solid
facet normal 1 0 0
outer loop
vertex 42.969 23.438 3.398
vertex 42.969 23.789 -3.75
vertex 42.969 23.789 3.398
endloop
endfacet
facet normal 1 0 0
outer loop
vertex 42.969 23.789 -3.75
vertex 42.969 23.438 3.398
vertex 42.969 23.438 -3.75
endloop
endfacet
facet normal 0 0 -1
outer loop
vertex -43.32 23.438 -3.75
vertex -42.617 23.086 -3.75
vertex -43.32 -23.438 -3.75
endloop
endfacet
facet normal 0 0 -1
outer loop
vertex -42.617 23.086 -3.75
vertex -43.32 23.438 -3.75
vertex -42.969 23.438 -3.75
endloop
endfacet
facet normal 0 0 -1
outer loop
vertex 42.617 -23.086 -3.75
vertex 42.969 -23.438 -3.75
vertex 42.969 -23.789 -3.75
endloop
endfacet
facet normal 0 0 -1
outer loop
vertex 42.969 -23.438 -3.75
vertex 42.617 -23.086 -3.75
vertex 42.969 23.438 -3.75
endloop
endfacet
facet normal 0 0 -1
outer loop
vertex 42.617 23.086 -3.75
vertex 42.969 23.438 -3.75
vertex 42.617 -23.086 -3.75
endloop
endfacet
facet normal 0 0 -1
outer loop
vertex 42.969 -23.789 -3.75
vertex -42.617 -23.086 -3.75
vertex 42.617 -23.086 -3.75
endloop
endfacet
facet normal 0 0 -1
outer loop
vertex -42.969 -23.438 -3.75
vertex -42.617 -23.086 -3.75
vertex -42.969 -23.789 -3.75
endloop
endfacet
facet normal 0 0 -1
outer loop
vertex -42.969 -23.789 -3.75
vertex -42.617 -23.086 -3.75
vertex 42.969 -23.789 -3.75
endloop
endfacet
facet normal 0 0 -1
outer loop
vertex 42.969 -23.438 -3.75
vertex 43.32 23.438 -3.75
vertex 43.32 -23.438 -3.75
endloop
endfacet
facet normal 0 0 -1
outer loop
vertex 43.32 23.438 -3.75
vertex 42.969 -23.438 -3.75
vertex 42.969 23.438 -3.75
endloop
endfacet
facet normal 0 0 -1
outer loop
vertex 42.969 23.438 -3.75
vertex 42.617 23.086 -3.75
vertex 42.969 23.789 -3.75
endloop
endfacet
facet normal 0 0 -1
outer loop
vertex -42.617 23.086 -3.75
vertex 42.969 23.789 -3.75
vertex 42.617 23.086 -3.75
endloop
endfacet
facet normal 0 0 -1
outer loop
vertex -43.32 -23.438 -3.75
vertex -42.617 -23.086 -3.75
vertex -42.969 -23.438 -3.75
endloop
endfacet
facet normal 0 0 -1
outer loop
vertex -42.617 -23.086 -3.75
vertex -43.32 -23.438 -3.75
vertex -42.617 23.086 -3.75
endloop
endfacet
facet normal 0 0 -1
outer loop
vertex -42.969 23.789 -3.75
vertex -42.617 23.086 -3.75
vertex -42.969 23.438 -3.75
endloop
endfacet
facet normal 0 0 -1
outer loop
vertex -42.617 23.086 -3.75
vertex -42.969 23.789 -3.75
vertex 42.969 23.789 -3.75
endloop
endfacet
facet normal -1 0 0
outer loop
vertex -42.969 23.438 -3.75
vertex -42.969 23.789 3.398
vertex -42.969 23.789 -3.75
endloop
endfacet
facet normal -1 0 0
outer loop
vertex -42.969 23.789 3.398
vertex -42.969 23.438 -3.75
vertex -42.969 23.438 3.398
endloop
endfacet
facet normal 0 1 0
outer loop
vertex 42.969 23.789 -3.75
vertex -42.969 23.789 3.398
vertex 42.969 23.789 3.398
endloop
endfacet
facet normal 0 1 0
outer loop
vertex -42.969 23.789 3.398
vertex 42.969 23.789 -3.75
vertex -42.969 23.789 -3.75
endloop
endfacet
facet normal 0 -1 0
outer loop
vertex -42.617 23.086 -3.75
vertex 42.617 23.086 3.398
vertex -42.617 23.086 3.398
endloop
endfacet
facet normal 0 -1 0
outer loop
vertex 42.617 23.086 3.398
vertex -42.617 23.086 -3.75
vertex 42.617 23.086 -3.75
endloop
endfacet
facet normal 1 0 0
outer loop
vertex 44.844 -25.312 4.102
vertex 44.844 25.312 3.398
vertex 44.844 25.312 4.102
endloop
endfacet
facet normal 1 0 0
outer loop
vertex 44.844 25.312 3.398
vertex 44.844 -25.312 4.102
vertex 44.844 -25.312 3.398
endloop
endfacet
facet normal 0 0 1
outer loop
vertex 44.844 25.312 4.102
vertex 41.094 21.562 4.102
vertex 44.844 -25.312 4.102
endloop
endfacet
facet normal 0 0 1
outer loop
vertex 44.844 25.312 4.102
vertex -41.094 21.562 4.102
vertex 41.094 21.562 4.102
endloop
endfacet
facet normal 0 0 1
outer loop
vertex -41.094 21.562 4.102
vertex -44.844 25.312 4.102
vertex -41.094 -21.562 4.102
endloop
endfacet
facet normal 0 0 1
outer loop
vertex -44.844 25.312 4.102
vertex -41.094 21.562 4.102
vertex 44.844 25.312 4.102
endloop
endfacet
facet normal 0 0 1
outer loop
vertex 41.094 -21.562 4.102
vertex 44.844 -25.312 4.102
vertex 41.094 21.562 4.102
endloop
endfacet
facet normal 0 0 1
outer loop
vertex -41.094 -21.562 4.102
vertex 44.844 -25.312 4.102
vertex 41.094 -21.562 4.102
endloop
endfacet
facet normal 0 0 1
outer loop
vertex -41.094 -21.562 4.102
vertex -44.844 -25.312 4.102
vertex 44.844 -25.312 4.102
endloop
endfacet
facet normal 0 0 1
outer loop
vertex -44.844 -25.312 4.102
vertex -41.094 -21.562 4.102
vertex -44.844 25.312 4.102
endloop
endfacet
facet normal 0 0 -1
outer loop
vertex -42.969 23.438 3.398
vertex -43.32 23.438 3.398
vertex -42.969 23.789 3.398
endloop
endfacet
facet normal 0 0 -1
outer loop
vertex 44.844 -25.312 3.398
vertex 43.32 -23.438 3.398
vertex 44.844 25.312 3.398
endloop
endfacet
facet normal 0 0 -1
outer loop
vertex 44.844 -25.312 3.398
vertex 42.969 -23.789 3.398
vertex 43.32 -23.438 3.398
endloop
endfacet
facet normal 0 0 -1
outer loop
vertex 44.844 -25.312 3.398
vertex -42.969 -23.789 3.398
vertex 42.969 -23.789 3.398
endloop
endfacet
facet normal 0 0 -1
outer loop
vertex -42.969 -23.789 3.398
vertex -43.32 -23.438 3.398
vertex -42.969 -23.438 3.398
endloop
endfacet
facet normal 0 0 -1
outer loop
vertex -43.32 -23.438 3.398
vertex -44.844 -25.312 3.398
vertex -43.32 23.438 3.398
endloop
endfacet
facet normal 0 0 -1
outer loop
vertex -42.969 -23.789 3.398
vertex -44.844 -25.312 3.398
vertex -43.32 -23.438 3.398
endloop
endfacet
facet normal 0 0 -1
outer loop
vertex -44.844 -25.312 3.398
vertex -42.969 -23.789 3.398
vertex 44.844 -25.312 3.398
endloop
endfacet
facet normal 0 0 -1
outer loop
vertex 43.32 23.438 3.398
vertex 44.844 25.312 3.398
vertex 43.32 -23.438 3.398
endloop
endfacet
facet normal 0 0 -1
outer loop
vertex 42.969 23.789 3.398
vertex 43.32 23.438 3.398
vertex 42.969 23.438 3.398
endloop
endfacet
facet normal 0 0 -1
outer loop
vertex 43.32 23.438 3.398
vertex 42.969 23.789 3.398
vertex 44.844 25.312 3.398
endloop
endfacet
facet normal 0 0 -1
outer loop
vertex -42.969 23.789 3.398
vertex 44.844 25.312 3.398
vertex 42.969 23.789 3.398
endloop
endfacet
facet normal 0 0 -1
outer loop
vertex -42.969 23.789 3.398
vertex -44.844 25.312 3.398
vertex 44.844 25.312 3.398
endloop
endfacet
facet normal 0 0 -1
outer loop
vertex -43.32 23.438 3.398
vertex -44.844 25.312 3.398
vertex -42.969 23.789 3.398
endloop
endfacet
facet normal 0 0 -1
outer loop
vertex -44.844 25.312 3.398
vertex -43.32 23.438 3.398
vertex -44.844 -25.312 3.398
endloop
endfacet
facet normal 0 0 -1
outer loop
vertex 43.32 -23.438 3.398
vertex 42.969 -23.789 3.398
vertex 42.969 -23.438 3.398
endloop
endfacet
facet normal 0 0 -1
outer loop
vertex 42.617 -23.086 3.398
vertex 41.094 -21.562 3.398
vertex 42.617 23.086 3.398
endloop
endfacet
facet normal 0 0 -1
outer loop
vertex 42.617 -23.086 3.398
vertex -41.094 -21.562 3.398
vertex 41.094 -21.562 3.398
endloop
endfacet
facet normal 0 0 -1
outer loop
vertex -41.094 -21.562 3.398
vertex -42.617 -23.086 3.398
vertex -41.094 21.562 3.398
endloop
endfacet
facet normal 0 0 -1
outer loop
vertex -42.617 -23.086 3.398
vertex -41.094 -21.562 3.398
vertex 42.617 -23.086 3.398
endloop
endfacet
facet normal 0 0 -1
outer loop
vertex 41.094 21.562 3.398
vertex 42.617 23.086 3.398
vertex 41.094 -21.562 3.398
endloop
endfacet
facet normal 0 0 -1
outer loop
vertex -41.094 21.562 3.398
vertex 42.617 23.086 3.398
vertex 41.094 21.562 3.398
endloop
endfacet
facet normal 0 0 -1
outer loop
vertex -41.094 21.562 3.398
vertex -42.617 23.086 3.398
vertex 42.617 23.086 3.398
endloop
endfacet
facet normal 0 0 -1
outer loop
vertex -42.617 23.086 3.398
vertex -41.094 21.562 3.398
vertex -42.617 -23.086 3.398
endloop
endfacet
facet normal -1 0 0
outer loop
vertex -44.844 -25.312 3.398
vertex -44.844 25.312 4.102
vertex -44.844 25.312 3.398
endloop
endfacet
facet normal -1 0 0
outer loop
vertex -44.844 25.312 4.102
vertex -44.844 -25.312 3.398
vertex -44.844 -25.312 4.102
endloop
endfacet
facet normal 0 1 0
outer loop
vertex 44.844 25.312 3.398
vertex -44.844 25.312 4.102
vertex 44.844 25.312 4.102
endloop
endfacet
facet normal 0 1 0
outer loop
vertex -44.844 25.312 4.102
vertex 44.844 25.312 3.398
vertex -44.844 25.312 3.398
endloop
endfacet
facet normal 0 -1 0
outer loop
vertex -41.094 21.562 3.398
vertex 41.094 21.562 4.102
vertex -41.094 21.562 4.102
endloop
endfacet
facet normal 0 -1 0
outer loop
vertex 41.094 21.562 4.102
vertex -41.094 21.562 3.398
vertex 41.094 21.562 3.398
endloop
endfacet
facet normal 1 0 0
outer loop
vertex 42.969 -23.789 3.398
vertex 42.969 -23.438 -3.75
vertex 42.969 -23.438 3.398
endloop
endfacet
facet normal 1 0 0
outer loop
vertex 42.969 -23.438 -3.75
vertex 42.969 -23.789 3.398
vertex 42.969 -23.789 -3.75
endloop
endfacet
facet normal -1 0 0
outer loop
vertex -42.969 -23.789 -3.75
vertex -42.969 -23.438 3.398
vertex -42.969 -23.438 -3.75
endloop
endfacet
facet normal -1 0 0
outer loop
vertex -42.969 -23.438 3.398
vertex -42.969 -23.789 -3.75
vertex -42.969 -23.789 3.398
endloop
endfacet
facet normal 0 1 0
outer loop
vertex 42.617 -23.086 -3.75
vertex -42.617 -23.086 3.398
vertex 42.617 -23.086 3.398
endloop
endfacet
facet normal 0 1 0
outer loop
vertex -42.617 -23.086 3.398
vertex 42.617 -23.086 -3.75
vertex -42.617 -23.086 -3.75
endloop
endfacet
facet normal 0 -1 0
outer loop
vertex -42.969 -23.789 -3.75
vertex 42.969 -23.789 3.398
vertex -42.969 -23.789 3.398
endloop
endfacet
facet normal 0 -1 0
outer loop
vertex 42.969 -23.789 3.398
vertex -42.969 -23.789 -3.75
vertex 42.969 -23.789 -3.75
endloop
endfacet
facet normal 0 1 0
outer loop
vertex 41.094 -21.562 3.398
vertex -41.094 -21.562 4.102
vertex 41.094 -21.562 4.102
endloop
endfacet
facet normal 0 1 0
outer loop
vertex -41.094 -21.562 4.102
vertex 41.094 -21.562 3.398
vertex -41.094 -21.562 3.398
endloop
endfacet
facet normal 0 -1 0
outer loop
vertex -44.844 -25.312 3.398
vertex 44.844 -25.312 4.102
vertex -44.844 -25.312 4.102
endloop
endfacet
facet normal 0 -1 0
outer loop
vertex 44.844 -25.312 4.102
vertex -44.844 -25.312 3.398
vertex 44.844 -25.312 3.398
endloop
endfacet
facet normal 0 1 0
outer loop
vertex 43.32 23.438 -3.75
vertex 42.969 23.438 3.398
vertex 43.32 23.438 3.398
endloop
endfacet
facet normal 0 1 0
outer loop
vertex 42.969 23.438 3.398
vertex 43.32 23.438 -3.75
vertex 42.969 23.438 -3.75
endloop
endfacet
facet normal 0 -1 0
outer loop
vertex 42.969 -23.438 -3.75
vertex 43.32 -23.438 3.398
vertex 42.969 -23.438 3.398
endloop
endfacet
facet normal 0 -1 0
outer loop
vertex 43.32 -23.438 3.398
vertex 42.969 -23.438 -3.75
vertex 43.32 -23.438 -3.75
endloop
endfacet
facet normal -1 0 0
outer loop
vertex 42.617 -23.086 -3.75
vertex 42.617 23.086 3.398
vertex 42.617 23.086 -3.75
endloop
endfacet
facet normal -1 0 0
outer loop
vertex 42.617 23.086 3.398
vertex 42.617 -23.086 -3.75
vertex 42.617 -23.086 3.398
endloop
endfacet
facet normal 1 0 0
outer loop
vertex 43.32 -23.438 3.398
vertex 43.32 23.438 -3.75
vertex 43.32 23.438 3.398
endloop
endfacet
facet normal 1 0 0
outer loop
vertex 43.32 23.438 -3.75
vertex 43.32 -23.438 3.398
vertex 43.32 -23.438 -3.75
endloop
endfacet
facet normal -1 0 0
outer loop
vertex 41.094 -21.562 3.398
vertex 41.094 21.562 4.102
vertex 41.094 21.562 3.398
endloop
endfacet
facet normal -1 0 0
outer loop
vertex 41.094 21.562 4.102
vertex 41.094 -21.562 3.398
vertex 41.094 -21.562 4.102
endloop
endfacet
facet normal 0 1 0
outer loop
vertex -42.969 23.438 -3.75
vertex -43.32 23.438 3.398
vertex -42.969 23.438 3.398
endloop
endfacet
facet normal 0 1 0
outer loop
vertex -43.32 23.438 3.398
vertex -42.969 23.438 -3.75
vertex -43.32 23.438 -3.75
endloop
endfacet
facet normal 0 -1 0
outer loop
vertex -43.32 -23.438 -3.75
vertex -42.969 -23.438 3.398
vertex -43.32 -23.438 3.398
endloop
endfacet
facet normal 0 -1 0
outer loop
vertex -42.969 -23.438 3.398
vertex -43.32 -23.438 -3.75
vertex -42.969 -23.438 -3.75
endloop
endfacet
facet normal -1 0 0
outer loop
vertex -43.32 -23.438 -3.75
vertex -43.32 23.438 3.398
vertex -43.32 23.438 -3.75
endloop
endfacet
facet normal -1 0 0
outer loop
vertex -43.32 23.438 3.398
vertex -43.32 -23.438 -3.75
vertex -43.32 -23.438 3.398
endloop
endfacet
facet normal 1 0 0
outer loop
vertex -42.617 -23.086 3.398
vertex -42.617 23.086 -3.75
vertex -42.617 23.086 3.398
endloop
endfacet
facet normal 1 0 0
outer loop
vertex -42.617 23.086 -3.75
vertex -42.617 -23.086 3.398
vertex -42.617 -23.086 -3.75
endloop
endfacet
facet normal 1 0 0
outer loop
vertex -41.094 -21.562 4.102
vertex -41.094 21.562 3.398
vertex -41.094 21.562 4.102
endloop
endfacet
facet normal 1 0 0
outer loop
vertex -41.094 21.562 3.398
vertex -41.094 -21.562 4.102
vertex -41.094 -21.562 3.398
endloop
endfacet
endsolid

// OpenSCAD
//sandpit
woodThickness=45;
woodWidth = 240;
scale=1/64;

module sandpit(length,width) {
    translate([0,width/2,0]) side (length);
        translate([0,-width/2,0]) side (length);
        translate([length/2,0,0])  rotate([0, 0,90]) side (width);
        translate([-length/2,0,0])  rotate([0, 0,90])  side (width);
}

module side(length) {
    //walls 
    cube ([length,woodThickness,woodWidth*2],center=true);
    //seat
    translate([0,0,woodWidth]) color("blue") cube ([length+woodWidth,woodWidth,woodThickness],center=true);
}

 

scale([scale,scale,scale]) sandpit (5500,3000);
